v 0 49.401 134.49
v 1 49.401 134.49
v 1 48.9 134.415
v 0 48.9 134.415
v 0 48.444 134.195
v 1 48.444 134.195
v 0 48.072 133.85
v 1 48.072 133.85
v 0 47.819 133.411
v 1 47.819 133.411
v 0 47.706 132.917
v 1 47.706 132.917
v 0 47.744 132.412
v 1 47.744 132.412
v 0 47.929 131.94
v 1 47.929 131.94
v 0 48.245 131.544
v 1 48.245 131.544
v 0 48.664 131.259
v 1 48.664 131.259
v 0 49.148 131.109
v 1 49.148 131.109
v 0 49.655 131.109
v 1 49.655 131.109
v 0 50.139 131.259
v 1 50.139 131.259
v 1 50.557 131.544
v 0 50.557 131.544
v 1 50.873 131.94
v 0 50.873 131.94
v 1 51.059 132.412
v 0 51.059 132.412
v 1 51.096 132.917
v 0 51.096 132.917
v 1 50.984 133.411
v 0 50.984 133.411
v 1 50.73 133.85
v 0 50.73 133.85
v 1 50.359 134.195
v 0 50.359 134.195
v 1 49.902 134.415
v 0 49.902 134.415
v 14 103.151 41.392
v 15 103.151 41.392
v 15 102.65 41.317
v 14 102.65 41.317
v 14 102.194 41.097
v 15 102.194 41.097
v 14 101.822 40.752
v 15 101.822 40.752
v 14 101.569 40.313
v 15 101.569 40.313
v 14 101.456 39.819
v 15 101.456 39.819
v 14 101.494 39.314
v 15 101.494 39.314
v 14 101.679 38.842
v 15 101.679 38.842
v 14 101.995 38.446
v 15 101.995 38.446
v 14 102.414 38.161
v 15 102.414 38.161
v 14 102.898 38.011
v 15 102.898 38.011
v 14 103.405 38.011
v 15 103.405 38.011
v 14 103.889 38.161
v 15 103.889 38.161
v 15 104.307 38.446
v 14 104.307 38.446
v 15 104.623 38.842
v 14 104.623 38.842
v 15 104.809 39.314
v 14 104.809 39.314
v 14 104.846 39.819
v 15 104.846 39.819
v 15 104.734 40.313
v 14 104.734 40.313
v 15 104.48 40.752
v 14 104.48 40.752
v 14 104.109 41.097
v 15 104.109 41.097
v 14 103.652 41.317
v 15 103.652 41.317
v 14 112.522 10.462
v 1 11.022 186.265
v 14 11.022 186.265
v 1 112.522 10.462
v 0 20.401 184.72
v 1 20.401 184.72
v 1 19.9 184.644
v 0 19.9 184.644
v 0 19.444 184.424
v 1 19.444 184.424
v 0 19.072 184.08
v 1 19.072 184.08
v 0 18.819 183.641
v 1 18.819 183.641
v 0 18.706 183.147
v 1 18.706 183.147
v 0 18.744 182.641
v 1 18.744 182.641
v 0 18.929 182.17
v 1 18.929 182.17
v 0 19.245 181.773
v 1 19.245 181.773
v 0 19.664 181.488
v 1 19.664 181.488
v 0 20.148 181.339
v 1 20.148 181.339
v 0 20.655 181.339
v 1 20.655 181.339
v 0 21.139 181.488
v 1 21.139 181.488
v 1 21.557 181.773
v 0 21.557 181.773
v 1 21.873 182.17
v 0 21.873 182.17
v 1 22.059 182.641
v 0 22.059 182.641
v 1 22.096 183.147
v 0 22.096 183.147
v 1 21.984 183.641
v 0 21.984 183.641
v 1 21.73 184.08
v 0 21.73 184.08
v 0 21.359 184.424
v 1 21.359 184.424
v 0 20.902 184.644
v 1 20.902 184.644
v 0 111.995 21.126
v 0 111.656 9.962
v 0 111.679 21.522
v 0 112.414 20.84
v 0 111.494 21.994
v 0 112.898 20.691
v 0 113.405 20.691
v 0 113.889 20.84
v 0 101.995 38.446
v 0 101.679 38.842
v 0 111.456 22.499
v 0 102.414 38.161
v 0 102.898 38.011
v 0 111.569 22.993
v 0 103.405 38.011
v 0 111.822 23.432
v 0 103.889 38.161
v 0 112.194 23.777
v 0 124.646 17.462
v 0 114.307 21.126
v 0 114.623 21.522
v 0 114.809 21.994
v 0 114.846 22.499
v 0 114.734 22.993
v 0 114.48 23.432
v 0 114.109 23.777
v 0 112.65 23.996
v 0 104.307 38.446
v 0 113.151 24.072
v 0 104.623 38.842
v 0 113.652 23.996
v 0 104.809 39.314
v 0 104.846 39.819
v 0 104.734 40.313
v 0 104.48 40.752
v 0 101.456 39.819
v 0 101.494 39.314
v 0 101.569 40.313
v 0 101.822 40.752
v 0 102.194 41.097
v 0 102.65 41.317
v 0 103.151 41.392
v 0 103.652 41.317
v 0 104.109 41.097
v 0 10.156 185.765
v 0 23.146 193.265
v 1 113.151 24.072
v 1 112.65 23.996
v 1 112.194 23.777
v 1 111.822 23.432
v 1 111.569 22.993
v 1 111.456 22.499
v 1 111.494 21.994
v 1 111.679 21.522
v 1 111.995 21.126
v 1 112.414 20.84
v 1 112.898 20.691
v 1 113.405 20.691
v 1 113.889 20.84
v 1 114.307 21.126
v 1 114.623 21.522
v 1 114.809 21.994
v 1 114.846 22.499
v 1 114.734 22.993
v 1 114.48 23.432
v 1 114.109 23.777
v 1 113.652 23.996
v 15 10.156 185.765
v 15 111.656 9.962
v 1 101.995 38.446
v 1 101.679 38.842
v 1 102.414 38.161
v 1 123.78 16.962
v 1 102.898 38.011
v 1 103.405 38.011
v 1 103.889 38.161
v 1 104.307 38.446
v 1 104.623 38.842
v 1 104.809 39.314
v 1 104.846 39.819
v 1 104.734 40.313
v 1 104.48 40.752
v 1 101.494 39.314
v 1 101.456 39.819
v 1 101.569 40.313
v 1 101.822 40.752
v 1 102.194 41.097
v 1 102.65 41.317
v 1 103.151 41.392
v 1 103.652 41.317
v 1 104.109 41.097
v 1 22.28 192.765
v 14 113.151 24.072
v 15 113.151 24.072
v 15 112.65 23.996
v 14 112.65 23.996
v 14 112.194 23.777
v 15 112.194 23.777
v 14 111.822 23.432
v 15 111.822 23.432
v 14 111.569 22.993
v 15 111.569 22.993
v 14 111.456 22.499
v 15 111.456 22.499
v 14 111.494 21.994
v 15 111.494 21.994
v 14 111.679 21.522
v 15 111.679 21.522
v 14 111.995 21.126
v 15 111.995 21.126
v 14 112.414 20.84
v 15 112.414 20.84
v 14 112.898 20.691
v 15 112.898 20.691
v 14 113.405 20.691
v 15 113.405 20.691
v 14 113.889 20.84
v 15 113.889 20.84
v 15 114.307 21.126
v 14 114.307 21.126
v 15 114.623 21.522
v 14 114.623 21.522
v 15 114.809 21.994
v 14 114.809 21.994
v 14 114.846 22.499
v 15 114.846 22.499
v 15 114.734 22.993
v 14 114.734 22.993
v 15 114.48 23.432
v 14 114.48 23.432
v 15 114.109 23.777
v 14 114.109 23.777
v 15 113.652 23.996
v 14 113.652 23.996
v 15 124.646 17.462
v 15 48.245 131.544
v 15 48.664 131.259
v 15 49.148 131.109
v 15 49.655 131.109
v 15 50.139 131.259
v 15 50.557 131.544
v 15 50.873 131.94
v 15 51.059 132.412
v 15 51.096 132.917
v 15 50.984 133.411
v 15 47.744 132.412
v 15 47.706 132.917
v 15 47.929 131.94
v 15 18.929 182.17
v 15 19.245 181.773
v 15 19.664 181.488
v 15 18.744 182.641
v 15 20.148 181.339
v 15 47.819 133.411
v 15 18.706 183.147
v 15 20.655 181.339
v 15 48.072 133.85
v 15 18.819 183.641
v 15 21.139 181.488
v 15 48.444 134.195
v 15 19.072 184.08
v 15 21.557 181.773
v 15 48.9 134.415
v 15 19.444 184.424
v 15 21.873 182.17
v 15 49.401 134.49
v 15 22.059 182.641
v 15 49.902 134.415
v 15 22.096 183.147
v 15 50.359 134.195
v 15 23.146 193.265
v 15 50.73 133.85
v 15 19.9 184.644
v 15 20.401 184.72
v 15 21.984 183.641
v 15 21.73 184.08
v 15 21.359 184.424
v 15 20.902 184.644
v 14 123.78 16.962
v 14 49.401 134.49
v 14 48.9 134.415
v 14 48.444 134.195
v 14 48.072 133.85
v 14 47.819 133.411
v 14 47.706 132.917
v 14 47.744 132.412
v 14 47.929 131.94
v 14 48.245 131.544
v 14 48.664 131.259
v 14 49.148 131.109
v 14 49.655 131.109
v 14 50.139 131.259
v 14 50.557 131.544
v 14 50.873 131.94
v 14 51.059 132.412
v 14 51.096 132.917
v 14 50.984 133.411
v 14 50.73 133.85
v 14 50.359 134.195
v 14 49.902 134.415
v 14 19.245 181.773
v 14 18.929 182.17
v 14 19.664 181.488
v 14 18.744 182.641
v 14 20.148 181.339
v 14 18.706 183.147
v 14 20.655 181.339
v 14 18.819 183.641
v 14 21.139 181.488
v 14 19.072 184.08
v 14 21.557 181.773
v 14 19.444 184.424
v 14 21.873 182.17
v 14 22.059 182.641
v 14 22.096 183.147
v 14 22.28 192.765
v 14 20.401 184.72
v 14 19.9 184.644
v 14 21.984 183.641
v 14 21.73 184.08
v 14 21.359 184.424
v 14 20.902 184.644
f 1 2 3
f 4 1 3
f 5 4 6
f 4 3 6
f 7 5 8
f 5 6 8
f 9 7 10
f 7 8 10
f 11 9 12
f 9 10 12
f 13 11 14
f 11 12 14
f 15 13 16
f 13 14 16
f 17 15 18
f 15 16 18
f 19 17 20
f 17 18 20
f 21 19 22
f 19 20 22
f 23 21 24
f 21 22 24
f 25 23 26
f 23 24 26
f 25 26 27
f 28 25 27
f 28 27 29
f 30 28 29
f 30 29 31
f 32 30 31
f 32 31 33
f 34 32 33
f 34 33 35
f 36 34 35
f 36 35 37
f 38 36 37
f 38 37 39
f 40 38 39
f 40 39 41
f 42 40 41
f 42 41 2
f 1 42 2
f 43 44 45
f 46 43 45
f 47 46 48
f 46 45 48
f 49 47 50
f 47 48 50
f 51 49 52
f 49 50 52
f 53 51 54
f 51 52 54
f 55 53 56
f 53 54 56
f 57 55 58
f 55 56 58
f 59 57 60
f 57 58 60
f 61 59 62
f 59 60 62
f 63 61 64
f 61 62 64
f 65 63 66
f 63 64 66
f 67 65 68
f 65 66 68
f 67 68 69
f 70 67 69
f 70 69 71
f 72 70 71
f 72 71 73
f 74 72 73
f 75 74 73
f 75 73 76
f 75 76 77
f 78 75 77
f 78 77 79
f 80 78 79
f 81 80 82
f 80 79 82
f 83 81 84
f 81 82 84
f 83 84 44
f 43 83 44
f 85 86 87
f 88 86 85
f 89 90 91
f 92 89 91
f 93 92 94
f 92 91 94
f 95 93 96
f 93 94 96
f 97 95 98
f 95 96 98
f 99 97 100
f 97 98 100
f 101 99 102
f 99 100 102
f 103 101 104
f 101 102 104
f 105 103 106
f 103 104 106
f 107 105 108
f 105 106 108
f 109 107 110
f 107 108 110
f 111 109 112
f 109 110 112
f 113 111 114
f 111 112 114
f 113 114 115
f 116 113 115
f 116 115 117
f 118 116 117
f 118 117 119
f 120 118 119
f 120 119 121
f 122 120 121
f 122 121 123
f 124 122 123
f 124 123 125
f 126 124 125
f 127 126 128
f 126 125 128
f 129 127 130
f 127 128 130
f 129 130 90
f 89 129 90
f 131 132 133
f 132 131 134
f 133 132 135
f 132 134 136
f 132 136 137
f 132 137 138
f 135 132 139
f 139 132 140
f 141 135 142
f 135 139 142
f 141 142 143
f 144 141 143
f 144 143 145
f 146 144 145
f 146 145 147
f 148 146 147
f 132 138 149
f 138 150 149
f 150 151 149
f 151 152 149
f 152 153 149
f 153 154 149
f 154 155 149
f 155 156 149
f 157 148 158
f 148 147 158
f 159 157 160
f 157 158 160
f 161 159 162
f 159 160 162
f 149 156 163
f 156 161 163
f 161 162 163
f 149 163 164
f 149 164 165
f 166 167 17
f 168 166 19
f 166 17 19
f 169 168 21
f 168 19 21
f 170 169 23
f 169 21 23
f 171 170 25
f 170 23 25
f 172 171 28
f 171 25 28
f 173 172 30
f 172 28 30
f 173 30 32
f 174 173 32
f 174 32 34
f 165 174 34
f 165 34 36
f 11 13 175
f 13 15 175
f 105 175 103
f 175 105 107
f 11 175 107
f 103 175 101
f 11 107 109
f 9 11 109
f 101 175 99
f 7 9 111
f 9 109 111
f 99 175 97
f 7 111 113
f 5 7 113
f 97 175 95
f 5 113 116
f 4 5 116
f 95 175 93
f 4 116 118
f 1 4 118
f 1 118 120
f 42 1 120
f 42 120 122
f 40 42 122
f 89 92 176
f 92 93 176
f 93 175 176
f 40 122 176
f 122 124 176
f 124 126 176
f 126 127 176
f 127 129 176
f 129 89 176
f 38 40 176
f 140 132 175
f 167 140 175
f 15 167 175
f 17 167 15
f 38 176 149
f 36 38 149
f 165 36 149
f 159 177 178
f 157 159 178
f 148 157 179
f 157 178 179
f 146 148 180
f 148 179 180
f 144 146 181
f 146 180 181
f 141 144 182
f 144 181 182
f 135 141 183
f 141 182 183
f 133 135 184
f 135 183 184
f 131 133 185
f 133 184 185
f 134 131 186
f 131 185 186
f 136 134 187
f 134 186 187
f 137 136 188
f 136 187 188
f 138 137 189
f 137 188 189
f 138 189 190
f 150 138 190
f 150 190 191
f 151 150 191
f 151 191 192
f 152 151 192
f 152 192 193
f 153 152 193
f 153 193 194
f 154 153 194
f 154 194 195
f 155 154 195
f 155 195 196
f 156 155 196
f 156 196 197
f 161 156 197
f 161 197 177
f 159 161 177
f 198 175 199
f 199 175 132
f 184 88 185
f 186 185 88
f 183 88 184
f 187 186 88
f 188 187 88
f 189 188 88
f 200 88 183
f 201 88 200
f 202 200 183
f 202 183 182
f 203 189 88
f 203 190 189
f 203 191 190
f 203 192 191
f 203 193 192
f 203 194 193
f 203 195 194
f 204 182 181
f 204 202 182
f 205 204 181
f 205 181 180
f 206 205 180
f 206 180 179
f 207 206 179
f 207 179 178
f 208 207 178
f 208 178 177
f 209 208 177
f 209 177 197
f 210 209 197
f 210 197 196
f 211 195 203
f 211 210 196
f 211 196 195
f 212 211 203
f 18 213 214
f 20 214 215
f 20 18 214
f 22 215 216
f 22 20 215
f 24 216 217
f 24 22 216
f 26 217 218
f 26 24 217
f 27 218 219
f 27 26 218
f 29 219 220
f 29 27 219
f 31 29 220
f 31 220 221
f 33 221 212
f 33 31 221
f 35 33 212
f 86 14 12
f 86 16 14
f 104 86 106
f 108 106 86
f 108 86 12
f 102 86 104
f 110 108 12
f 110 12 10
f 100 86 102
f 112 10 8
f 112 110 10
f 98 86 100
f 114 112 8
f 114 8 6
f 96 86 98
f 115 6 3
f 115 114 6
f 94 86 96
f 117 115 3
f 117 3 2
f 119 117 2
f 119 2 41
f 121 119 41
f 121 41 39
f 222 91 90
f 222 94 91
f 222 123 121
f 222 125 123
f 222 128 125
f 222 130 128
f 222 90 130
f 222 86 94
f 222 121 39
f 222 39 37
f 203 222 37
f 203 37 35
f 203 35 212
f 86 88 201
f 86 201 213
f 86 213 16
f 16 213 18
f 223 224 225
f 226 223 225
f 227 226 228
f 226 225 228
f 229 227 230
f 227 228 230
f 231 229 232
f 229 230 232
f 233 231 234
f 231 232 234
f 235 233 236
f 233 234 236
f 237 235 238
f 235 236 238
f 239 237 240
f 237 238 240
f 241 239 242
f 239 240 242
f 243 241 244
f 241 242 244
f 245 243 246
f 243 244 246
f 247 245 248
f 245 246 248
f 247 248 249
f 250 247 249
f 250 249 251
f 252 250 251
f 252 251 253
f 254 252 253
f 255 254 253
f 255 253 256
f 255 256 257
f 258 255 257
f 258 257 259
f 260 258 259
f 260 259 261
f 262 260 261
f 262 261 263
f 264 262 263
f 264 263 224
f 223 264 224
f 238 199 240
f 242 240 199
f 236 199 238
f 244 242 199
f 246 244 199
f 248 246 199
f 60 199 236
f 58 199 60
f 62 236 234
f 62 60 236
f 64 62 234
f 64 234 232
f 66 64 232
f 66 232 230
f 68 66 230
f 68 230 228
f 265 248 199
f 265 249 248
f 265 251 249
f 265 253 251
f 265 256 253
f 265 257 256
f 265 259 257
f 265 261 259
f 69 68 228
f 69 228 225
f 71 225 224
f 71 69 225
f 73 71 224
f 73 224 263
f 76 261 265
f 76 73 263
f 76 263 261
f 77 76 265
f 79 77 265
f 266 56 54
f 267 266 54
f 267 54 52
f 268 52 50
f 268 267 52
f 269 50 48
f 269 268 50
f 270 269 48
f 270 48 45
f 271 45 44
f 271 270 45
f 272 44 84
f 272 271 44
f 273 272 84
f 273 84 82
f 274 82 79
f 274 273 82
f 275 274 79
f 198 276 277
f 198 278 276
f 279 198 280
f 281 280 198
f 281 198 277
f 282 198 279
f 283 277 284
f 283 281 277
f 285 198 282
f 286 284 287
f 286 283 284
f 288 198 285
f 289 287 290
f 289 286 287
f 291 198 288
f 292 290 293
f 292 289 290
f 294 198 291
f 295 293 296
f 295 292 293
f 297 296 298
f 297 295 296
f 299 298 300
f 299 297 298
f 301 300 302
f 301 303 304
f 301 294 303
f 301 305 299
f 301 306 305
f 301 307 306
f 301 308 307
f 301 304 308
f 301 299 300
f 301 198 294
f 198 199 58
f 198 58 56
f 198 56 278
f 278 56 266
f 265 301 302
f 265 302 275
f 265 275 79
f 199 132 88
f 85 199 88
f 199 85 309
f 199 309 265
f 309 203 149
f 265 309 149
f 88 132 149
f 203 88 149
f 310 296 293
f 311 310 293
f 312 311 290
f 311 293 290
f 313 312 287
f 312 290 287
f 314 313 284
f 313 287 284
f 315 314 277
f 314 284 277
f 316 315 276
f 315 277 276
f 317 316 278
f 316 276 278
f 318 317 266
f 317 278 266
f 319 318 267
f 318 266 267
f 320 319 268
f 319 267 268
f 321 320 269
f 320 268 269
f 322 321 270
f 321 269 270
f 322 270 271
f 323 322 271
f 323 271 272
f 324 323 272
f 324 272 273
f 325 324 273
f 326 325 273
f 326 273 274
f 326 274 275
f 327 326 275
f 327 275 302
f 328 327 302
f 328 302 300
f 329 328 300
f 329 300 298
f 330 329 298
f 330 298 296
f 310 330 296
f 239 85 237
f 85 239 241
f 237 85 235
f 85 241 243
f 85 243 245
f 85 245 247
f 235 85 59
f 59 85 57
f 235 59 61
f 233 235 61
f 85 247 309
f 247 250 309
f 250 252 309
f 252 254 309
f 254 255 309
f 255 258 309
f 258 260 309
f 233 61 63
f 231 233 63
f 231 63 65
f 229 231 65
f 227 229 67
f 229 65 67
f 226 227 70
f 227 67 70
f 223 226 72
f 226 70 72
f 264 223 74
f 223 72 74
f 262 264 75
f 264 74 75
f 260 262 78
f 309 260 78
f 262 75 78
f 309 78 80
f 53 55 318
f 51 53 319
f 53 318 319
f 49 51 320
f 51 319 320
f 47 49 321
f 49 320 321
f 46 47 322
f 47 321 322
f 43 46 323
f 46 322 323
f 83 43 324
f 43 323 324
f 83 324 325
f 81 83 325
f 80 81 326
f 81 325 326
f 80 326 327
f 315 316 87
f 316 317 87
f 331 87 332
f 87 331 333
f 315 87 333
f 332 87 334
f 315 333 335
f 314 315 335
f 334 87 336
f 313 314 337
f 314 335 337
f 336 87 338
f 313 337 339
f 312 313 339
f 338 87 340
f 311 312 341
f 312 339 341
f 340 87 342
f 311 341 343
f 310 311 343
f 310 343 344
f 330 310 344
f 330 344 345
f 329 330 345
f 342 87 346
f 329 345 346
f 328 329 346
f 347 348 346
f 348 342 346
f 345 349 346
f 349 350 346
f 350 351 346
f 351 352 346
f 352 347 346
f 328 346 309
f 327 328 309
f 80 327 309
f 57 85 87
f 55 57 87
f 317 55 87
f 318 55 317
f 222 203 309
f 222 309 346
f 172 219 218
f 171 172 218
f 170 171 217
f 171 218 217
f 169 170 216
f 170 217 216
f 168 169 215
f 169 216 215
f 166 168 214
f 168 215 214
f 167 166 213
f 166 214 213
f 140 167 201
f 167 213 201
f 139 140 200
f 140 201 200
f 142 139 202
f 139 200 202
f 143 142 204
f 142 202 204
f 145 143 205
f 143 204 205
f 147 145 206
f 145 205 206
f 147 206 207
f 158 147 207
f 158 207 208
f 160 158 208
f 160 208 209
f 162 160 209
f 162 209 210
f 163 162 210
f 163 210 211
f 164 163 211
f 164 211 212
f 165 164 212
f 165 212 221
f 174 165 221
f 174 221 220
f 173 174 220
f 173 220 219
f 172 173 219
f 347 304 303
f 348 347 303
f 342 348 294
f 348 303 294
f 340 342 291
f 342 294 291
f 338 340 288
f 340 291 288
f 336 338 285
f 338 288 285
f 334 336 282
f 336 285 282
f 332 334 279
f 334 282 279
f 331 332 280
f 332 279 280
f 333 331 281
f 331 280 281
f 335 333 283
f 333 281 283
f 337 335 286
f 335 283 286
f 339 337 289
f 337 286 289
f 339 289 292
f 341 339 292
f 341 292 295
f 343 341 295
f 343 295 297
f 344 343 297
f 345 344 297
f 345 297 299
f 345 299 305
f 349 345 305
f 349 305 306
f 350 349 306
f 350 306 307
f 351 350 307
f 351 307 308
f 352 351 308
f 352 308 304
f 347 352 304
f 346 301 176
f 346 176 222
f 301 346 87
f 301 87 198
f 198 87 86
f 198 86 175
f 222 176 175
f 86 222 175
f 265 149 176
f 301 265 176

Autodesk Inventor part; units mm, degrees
ref_plane "YZ Plane" through (0, 0, 0) normal (1, 0, 0) x (0, 1, 0)
ref_plane "XZ Plane" through (0, 0, 0) normal (0, 1, 0) x (-1, 0, 0)
ref_plane "XY Plane" through (0, 0, 0) normal (0, 0, 1) x (1, 0, 0)
sketch "スケッチ1" plane through (0, 0, 0) normal (1, 0, 0) x (0, 1, 0)
  circle A0 centre (71.3451, 9.7822) radius 120
  line L0 (71.3451, 9.7822) -> (-260.1174, 9.7822) construction
  line L1 (138.8451, -107.1313) -> (-63.6549, 9.7822)
  circle A1 centre (71.3451, 9.7822) radius 5
  line L2 (71.3451, 9.7822) -> (138.8451, 126.6956) construction
  line L3 (71.3451, 9.7822) -> (138.8451, -107.1313) construction
  line L4 (71.3451, 9.7822) -> (-63.6549, 9.7822)
  line L5 (88.381, 47.2892) -> (83.381, 38.629) construction
  line L6 (83.381, 38.629) -> (86.8451, 36.629) construction
  line L7 (86.8451, 36.629) -> (91.8451, 45.2892) construction
  line L8 (91.8451, 45.2892) -> (88.381, 47.2892)
  line L9 (91.8451, 45.2892) -> (86.8451, 36.629) construction
  line L10 (86.8451, 36.629) -> (90.3092, 34.629) construction
  line L11 (90.3092, 34.629) -> (95.3092, 43.2892) construction
  line L12 (95.3092, 43.2892) -> (91.8451, 45.2892)
  line L13 (85.881, 42.9591) -> (92.8092, 38.9591) construction
  circle A2 centre (71.3451, 9.7822) radius 2.65 construction
  line L14 (88.1645, 47.4142) -> (81.6645, 36.1559) construction
  line L15 (81.6645, 36.1559) -> (77.3344, 38.6559) construction
  line L16 (77.3344, 38.6559) -> (83.8344, 49.9142) construction
  line L17 (83.8344, 49.9142) -> (88.1645, 47.4142)
  line L18 (95.5257, 43.1642) -> (89.0257, 31.9059) construction
  line L19 (89.0257, 31.9059) -> (93.3559, 29.4059) construction
  line L20 (93.3559, 29.4059) -> (99.8559, 40.6642) construction
  line L21 (99.8559, 40.6642) -> (95.5257, 43.1642)
  circle A3 centre (71.3451, 9.7822) radius 28.3207 construction
  line L22 (30.3451, 19.0322) -> (30.3451, 14.0322)
  line L23 (30.3451, 14.0322) -> (43.3451, 14.0322) construction
  line L24 (43.3451, 19.0322) -> (30.3451, 19.0322) construction
  line L25 (43.3451, 14.0322) -> (43.3451, 19.0322)
  line L26 (30.3451, 5.5322) -> (43.3451, 5.5322) construction
  line L27 (30.3451, 0.5322) -> (30.3451, 5.5322)
  line L28 (43.3451, 0.5322) -> (30.3451, 0.5322) construction
  line L29 (43.3451, 5.5322) -> (43.3451, 0.5322)
  line L30 (83.8344, -30.3499) -> (88.1645, -27.8499)
  line L31 (88.1645, -27.8499) -> (81.6645, -16.5915) construction
  line L32 (77.3344, -19.0915) -> (83.8344, -30.3499) construction
  line L33 (81.6645, -16.5915) -> (77.3344, -19.0915) construction
  line L34 (95.5257, -23.5999) -> (89.0257, -12.3415) construction
  line L35 (99.8559, -21.0999) -> (95.5257, -23.5999)
  line L36 (93.3559, -9.8415) -> (99.8559, -21.0999) construction
  line L37 (89.0257, -12.3415) -> (93.3559, -9.8415) construction
  line L38 (77.3344, 38.6559) -> (76.7181, 37.5885)
  line L39 (93.3559, 29.4059) -> (92.7396, 28.3385) construction
  line L40 (43.3451, 19.0322) -> (44.5776, 19.0322)
  line L41 (43.3451, 0.5322) -> (44.5776, 0.5322)
  line L42 (77.3344, -19.0915) -> (73.5386, -12.517) construction
  line L43 (93.3559, -9.8415) -> (92.7396, -8.7742) construction
  line L44 (84.956, 41.3569) -> (74.956, 24.0364) construction
  line L45 (74.956, 24.0364) -> (69.7599, 27.0364) construction
  line L46 (69.7599, 27.0364) -> (79.7599, 44.3569) construction
  line L47 (79.7599, 44.3569) -> (84.956, 41.3569)
  circle A4 centre (74.8579, 29.8666) radius 1.5
  circle A5 centre (79.8579, 38.5268) radius 1.5
  circle A6 centre (86.9823, 22.8666) radius 1.5
  circle A7 centre (91.9823, 31.5268) radius 1.5
  circle A8 centre (42.1951, 16.7822) radius 1.5
  circle A9 centre (52.1951, 16.7822) radius 1.5
  circle A10 centre (52.1951, 2.7822) radius 1.5
  circle A11 centre (42.1951, 2.7822) radius 1.5
  circle A12 centre (79.8579, -18.9625) radius 1.5
  circle A13 centre (74.8579, -10.3022) radius 1.5
  circle A14 centre (86.9823, -3.3022) radius 1.5
  circle A15 centre (91.9823, -11.9625) radius 1.5
  line L48 (72.3579, 25.5364) -> (84.956, 41.3569) construction
  circle A16 centre (71.3451, 9.7822) radius 34.3835
  line L49 (63.3451, 56.7822) -> (-116.6549, 56.7822) construction
  line L50 (-116.6549, 56.7822) -> (-116.6549, 41.7822)
  line L51 (-116.6549, 41.7822) -> (63.3451, 41.7822) construction
  line L52 (63.3451, 41.7822) -> (63.3451, 56.7822) construction
  circle A17 centre (53.3451, 49.2822) radius 1.5 construction
  circle A18 centre (43.3451, 49.2822) radius 1.5 construction
  line L53 (36.9617, 56.7822) -> (36.9617, 9.7822) construction
  line L54 (63.3451, 56.7822) -> (90.6652, 38.2244) construction
  line L55 (36.9617, -37.2178) -> (36.9617, 9.7822) construction
  line L56 (63.3451, -37.2178) -> (90.6652, -18.66) construction
  line L57 (63.3451, -37.2178) -> (-116.6549, -37.2178) construction
  line L58 (-116.6549, -22.2178) -> (63.3451, -22.2178) construction
  circle A19 centre (43.3451, -29.7178) radius 1.5 construction
  circle A20 centre (53.3451, -29.7178) radius 1.5 construction
  line L59 (71.3451, 9.7822) -> (54.1534, 39.5591)
  line L60 (62.8136, 44.5591) -> (45.4931, 34.5591)
  line L61 (45.4931, 34.5591) -> (50.4931, 25.8989)
  line L62 (50.4931, 25.8989) -> (67.8136, 35.8989)
  line L63 (67.8136, 35.8989) -> (62.8136, 44.5591)
  circle A21 centre (60.9835, 37.729) radius 1.5
  circle A22 centre (52.3233, 32.729) radius 1.5
  circle A23 centre (52.3233, -13.1647) radius 1.5
  circle A24 centre (60.9835, -18.1647) radius 1.5
  circle A25 centre (100.7286, 4.7822) radius 1.5
  circle A26 centre (100.7286, 14.7822) radius 1.5
  circle A27 centre (71.3451, 9.7822) radius 193.5
  line L64 (-121.5196, 25.4487) -> (154.2099, 184.6412)
  line L65 (71.3451, 9.7822) -> (11.3451, 113.7052)
  line L66 (71.3451, 9.7822) -> (71.3451, 203.2822)
  line L67 (124.6464, 17.4617) -> (23.1464, 193.2648)
  line L68 (23.1464, 193.2648) -> (10.156, 185.7648)
  line L69 (10.156, 185.7648) -> (111.656, 9.9617)
  line L70 (111.656, 9.9617) -> (124.6464, 17.4617)
  circle A28 centre (49.4012, 132.7902) radius 1.5
  circle A29 centre (20.4012, 183.0196) radius 1.5
  circle A30 centre (62.2784, 25.4862) radius 1.5
  circle A31 centre (71.3451, 9.7822) radius 12.5
  circle A32 centre (62.2784, -5.9219) radius 1.5
  circle A33 centre (89.4786, 9.7822) radius 1.5
  circle A34 centre (113.1512, 22.3719) radius 1.5
  circle A35 centre (103.1512, 39.6924) radius 1.5
  circle A36 centre (71.3451, 9.7822) radius 24.3835
  line L71 (124.6464, 17.4617) -> (93.4246, -0.5642)
  line L72 (104.6464, 52.1027) -> (73.4246, 34.0768)
  line L73 (18.0439, 2.1027) -> (49.2656, 20.1286)
  circle A37 centre (29.539, -2.8076) radius 1.5
  circle A38 centre (39.539, -20.1281) radius 1.5
  line L74 (38.0439, -32.5383) -> (-63.4561, 143.2648)
  line L75 (51.0342, -25.0383) -> (38.0439, -32.5383)
  line L76 (38.0439, -32.5383) -> (69.2656, -14.5125)
  point P0 (0, 0)
  point P1 (90.9669, 45.7962)
  point P2 (92.3451, 45.0005)
  point P3 (91.656, 44.6027)
  dimension "d4" = 3
  dimension "d5" = 3
  dimension "d6" = 10
  dimension "d7" = 10
  dimension "d8" = 7.5
  dimension "d9" = 7.5
  dimension "d10" = 60
  dimension "d11" = 10
  dimension "d12" = 10
  dimension "d13" = 10
  dimension "d14" = 3
  dimension "d15" = 5
  dimension "d16" = 5
  dimension "d17" = 360
  dimension "d18" = 387
  dimension "d19" = 110
  dimension "d20" = 60
  dimension "d21" = 15
  dimension "d22" = 73
  dimension "d23" = 3
  dimension "d24" = 3
  dimension "d25" = 7.5
  dimension "d26" = 7.5
  dimension "d27" = 7.5
  dimension "d28" = 7.5
  dimension "d29" = 3
  dimension "d30" = 25
  dimension "d31" = 6.25
  dimension "d32" = 360
  dimension "d33" = 20
  dimension "d34" = 3
  dimension "d35" = 3
  dimension "d36" = 10
  dimension "d37" = 7.5
  dimension "d38" = 7.5
  dimension "d39" = 20
  dimension "d40" = 35
  dimension "d41" = 10
extrude "押し出し1" add sketch "スケッチ1" along normal blind 15 contours L67 L66 L69 L64 A0 | A0 L64 L67 | L67 L72 L12 L8 L69 L66 | L64 L69 A0 | A0 L69 L68 L67 L64 | L67 L70 L69 L72 | L8 L12 L72 L69 | A28 | A29 | A34 | A35
shell "シェル1" thickness 1 removed faces 2 at (5, 18.8163, 190.7648) at (5, 115.9861, 12.4617)
hole "穴1" at (0, 138.8451, 126.6956) at (0, -63.6549, 9.7822) at (0, 138.8451, -107.1313) at (0, 20.4012, 183.0196) at (0, 49.4012, 132.7902) at (0, 103.1512, 39.6924) at (0, 113.1512, 22.3719) direction (1, 0, 0) diameter 3.4 end through all
equation "\"d9\" = d8"
properties part number "hand-grab-v3-ASP_1" material "アルミニウム 6061"
